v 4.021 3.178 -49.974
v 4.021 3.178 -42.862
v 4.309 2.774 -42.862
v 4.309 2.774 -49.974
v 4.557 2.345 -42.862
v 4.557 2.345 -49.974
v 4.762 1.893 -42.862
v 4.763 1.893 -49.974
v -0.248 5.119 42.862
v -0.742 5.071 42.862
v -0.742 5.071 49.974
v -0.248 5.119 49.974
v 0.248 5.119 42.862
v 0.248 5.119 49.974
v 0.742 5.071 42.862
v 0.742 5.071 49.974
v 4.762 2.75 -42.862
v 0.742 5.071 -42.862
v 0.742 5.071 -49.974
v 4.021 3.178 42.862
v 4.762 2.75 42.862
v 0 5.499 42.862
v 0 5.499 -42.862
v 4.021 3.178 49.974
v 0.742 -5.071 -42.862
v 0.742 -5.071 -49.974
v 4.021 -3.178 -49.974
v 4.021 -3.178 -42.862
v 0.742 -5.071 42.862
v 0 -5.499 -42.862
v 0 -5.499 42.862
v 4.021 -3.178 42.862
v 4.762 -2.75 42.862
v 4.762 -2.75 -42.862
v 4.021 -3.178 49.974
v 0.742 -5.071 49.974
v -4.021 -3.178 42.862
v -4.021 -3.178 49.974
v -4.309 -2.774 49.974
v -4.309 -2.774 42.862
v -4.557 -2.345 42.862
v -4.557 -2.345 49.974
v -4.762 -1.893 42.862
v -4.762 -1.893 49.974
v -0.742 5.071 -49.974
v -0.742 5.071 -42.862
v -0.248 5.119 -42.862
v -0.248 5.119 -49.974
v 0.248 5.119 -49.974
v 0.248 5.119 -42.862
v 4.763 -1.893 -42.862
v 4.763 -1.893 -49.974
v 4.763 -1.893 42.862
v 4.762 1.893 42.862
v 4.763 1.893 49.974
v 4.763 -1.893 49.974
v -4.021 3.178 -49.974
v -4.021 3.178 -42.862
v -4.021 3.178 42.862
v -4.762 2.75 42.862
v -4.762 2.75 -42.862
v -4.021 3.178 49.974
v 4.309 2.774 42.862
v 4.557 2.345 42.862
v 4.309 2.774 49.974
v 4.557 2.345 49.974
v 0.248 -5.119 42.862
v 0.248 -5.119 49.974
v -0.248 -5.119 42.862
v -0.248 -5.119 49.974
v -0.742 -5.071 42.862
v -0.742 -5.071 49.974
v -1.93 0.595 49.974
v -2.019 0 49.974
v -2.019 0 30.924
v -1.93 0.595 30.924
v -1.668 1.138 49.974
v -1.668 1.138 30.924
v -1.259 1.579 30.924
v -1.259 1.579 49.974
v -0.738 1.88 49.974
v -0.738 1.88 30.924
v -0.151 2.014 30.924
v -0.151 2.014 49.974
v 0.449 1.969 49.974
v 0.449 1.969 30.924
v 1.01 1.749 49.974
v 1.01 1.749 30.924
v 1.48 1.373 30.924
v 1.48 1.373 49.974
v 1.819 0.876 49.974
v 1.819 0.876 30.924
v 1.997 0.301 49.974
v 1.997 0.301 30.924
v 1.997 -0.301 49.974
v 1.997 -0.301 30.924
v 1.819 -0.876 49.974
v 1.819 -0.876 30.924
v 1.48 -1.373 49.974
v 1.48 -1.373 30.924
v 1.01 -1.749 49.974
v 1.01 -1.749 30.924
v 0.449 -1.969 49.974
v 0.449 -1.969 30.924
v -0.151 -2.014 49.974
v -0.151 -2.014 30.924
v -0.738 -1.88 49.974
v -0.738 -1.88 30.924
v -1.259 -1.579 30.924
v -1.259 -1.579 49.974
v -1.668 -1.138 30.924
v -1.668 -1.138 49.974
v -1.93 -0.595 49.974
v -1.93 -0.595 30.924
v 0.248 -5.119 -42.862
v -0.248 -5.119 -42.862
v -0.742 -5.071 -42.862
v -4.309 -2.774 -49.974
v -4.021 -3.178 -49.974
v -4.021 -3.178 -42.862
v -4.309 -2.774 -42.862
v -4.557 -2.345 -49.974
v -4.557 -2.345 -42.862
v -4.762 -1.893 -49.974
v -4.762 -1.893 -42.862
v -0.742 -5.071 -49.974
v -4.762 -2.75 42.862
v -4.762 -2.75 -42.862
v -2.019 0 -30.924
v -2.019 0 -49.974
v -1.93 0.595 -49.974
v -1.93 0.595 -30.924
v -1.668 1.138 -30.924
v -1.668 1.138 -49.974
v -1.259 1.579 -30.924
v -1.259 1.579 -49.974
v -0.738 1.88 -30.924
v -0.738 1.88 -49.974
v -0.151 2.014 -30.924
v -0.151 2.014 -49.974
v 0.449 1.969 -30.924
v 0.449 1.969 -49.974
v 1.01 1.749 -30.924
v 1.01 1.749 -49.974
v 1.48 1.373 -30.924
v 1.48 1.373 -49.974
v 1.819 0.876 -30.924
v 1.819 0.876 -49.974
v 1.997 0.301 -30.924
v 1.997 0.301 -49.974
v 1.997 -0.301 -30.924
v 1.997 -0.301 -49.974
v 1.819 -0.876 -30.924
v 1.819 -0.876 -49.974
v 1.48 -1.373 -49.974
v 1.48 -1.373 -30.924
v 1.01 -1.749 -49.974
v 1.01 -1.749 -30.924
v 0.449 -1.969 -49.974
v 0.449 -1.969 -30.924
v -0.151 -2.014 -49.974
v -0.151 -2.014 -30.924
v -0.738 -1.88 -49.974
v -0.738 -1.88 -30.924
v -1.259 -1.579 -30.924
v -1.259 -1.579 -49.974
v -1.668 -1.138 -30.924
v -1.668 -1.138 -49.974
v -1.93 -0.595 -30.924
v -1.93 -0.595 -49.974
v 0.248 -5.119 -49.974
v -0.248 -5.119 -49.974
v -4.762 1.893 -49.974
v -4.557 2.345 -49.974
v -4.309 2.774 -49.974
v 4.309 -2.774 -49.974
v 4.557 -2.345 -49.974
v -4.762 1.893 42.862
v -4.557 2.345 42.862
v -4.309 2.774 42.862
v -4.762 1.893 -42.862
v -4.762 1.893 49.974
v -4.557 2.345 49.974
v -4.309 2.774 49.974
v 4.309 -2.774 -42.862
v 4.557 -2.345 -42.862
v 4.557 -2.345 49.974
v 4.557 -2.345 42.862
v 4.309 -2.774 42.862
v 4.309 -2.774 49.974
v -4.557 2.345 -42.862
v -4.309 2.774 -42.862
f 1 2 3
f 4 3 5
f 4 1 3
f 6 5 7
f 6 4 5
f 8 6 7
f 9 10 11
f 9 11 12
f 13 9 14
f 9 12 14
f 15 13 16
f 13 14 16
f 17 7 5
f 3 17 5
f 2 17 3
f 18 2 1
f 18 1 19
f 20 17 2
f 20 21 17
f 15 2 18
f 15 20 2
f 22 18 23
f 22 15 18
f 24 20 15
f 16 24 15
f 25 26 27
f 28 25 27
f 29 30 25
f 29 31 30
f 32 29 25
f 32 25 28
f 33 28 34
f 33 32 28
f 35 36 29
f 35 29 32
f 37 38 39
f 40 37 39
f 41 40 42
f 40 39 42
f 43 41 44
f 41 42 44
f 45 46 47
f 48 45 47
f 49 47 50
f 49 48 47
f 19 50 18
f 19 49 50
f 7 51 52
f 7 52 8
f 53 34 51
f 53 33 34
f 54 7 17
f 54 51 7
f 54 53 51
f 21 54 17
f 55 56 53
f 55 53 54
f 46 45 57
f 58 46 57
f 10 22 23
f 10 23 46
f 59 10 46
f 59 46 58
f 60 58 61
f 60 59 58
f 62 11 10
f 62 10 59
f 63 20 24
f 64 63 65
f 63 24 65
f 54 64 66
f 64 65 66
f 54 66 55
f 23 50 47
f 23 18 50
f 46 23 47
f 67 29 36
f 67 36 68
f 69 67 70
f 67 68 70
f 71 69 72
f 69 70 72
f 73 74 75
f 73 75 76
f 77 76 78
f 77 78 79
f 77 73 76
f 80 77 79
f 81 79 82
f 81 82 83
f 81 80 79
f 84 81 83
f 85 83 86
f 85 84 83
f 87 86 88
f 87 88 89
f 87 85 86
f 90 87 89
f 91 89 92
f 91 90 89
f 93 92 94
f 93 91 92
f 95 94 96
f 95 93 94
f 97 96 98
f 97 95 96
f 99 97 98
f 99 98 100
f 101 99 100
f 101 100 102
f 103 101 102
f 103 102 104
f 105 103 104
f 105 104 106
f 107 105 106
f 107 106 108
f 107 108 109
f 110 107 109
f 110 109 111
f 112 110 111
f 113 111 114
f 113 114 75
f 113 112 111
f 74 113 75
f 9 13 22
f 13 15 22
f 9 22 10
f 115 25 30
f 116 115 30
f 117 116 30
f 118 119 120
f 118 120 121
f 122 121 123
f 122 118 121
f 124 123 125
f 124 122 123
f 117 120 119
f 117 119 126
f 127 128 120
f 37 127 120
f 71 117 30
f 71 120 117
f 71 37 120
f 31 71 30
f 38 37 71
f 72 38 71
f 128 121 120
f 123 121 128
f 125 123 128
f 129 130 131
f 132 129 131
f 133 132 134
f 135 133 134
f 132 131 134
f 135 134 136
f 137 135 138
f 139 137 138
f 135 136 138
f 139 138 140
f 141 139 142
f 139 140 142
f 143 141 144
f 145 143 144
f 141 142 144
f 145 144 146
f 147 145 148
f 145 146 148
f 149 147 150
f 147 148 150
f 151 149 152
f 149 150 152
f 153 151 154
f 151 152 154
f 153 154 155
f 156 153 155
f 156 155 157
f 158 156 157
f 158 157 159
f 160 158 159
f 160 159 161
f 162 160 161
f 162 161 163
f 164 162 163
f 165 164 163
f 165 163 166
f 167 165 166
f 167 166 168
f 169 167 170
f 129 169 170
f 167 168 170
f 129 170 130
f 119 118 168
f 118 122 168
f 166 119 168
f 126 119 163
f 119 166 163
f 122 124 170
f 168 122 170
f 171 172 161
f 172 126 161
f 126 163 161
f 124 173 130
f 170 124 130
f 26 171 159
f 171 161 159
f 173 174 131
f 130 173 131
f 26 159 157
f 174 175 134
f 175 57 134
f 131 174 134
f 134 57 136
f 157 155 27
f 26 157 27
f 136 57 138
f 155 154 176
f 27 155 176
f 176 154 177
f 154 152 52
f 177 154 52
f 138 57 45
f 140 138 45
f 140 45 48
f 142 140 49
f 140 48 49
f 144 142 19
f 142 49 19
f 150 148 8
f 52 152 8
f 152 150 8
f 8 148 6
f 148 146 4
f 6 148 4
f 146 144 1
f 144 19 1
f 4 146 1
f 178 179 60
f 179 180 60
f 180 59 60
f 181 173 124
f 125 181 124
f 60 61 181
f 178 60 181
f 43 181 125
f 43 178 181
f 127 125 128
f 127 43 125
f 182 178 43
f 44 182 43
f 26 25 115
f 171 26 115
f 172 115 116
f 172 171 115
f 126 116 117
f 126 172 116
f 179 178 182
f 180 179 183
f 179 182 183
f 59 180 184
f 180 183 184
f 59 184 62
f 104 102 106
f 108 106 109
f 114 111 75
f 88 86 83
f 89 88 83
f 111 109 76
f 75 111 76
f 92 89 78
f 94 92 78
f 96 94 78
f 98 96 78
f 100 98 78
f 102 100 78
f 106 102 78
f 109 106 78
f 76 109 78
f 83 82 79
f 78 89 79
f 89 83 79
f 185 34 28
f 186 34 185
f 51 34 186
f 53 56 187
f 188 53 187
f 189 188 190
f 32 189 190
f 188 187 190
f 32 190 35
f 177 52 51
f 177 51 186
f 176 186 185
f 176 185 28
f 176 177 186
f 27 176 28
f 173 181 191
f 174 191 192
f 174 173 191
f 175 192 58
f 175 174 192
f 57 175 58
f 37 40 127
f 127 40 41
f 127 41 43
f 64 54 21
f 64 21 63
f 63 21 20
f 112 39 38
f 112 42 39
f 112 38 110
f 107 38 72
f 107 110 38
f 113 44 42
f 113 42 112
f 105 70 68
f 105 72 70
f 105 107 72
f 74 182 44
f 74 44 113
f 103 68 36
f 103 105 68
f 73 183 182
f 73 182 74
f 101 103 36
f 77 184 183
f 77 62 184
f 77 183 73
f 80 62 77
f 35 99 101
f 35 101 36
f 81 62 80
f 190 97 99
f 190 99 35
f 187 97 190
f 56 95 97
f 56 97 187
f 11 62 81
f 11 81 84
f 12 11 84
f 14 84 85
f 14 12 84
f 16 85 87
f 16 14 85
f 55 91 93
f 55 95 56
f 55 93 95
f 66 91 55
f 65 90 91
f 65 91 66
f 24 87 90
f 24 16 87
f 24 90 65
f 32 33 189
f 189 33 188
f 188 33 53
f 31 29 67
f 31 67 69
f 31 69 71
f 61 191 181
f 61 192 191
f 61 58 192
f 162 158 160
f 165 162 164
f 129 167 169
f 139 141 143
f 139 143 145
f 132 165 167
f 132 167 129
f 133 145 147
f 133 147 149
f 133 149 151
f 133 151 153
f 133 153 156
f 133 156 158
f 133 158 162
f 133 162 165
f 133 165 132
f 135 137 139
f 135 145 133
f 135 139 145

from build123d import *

# Parameters (mm, degrees)
BOSS_EXTRUDE1_DEPTH = 49.9745
SKETCH2_R           = 2.0193
CUT_EXTRUDE1_DEPTH  = 19.05
SKETCH3_R           = 11.064818238
SKETCH3_R_2         = 5.125
CUT_EXTRUDE2_DEPTH  = 7.112


with BuildPart() as part:
    # Sketch1 → Boss-Extrude1 (new, symmetric)
    with BuildSketch(Plane.XY):
        Polygon((4.7625, 2.749630657), (0, 5.499261314), (-4.7625, 2.749630657), (-4.7625, -2.749630657), (0, -5.499261314), (4.7625, -2.749630657), align=None)
    extrude(amount=BOSS_EXTRUDE1_DEPTH, both=True)

    # Sketch2 → Cut-Extrude1 (cut)
    with BuildSketch(Plane(origin=(0, 0, -49.9745), x_dir=(-1, 0, 0), z_dir=(0, 0, -1))):
        Circle(SKETCH2_R)
    cut_extrude1 = extrude(amount=-CUT_EXTRUDE1_DEPTH, mode=Mode.SUBTRACT)

    # Mirror1: Cut-Extrude1 across plane
    add(cut_extrude1.mirror(Plane.XY), mode=Mode.SUBTRACT)

    # Sketch3 → Cut-Extrude2 (cut)
    with BuildSketch(Plane(origin=(0, 0, -49.9745), x_dir=(-1, 0, 0), z_dir=(0, 0, -1))):
        Circle(SKETCH3_R)
        Circle(SKETCH3_R_2, mode=Mode.SUBTRACT)
    cut_extrude2 = extrude(amount=-CUT_EXTRUDE2_DEPTH, mode=Mode.SUBTRACT)

    # Mirror2: Cut-Extrude2 across plane
    add(cut_extrude2.mirror(Plane.XY), mode=Mode.SUBTRACT)


solid = part.part
